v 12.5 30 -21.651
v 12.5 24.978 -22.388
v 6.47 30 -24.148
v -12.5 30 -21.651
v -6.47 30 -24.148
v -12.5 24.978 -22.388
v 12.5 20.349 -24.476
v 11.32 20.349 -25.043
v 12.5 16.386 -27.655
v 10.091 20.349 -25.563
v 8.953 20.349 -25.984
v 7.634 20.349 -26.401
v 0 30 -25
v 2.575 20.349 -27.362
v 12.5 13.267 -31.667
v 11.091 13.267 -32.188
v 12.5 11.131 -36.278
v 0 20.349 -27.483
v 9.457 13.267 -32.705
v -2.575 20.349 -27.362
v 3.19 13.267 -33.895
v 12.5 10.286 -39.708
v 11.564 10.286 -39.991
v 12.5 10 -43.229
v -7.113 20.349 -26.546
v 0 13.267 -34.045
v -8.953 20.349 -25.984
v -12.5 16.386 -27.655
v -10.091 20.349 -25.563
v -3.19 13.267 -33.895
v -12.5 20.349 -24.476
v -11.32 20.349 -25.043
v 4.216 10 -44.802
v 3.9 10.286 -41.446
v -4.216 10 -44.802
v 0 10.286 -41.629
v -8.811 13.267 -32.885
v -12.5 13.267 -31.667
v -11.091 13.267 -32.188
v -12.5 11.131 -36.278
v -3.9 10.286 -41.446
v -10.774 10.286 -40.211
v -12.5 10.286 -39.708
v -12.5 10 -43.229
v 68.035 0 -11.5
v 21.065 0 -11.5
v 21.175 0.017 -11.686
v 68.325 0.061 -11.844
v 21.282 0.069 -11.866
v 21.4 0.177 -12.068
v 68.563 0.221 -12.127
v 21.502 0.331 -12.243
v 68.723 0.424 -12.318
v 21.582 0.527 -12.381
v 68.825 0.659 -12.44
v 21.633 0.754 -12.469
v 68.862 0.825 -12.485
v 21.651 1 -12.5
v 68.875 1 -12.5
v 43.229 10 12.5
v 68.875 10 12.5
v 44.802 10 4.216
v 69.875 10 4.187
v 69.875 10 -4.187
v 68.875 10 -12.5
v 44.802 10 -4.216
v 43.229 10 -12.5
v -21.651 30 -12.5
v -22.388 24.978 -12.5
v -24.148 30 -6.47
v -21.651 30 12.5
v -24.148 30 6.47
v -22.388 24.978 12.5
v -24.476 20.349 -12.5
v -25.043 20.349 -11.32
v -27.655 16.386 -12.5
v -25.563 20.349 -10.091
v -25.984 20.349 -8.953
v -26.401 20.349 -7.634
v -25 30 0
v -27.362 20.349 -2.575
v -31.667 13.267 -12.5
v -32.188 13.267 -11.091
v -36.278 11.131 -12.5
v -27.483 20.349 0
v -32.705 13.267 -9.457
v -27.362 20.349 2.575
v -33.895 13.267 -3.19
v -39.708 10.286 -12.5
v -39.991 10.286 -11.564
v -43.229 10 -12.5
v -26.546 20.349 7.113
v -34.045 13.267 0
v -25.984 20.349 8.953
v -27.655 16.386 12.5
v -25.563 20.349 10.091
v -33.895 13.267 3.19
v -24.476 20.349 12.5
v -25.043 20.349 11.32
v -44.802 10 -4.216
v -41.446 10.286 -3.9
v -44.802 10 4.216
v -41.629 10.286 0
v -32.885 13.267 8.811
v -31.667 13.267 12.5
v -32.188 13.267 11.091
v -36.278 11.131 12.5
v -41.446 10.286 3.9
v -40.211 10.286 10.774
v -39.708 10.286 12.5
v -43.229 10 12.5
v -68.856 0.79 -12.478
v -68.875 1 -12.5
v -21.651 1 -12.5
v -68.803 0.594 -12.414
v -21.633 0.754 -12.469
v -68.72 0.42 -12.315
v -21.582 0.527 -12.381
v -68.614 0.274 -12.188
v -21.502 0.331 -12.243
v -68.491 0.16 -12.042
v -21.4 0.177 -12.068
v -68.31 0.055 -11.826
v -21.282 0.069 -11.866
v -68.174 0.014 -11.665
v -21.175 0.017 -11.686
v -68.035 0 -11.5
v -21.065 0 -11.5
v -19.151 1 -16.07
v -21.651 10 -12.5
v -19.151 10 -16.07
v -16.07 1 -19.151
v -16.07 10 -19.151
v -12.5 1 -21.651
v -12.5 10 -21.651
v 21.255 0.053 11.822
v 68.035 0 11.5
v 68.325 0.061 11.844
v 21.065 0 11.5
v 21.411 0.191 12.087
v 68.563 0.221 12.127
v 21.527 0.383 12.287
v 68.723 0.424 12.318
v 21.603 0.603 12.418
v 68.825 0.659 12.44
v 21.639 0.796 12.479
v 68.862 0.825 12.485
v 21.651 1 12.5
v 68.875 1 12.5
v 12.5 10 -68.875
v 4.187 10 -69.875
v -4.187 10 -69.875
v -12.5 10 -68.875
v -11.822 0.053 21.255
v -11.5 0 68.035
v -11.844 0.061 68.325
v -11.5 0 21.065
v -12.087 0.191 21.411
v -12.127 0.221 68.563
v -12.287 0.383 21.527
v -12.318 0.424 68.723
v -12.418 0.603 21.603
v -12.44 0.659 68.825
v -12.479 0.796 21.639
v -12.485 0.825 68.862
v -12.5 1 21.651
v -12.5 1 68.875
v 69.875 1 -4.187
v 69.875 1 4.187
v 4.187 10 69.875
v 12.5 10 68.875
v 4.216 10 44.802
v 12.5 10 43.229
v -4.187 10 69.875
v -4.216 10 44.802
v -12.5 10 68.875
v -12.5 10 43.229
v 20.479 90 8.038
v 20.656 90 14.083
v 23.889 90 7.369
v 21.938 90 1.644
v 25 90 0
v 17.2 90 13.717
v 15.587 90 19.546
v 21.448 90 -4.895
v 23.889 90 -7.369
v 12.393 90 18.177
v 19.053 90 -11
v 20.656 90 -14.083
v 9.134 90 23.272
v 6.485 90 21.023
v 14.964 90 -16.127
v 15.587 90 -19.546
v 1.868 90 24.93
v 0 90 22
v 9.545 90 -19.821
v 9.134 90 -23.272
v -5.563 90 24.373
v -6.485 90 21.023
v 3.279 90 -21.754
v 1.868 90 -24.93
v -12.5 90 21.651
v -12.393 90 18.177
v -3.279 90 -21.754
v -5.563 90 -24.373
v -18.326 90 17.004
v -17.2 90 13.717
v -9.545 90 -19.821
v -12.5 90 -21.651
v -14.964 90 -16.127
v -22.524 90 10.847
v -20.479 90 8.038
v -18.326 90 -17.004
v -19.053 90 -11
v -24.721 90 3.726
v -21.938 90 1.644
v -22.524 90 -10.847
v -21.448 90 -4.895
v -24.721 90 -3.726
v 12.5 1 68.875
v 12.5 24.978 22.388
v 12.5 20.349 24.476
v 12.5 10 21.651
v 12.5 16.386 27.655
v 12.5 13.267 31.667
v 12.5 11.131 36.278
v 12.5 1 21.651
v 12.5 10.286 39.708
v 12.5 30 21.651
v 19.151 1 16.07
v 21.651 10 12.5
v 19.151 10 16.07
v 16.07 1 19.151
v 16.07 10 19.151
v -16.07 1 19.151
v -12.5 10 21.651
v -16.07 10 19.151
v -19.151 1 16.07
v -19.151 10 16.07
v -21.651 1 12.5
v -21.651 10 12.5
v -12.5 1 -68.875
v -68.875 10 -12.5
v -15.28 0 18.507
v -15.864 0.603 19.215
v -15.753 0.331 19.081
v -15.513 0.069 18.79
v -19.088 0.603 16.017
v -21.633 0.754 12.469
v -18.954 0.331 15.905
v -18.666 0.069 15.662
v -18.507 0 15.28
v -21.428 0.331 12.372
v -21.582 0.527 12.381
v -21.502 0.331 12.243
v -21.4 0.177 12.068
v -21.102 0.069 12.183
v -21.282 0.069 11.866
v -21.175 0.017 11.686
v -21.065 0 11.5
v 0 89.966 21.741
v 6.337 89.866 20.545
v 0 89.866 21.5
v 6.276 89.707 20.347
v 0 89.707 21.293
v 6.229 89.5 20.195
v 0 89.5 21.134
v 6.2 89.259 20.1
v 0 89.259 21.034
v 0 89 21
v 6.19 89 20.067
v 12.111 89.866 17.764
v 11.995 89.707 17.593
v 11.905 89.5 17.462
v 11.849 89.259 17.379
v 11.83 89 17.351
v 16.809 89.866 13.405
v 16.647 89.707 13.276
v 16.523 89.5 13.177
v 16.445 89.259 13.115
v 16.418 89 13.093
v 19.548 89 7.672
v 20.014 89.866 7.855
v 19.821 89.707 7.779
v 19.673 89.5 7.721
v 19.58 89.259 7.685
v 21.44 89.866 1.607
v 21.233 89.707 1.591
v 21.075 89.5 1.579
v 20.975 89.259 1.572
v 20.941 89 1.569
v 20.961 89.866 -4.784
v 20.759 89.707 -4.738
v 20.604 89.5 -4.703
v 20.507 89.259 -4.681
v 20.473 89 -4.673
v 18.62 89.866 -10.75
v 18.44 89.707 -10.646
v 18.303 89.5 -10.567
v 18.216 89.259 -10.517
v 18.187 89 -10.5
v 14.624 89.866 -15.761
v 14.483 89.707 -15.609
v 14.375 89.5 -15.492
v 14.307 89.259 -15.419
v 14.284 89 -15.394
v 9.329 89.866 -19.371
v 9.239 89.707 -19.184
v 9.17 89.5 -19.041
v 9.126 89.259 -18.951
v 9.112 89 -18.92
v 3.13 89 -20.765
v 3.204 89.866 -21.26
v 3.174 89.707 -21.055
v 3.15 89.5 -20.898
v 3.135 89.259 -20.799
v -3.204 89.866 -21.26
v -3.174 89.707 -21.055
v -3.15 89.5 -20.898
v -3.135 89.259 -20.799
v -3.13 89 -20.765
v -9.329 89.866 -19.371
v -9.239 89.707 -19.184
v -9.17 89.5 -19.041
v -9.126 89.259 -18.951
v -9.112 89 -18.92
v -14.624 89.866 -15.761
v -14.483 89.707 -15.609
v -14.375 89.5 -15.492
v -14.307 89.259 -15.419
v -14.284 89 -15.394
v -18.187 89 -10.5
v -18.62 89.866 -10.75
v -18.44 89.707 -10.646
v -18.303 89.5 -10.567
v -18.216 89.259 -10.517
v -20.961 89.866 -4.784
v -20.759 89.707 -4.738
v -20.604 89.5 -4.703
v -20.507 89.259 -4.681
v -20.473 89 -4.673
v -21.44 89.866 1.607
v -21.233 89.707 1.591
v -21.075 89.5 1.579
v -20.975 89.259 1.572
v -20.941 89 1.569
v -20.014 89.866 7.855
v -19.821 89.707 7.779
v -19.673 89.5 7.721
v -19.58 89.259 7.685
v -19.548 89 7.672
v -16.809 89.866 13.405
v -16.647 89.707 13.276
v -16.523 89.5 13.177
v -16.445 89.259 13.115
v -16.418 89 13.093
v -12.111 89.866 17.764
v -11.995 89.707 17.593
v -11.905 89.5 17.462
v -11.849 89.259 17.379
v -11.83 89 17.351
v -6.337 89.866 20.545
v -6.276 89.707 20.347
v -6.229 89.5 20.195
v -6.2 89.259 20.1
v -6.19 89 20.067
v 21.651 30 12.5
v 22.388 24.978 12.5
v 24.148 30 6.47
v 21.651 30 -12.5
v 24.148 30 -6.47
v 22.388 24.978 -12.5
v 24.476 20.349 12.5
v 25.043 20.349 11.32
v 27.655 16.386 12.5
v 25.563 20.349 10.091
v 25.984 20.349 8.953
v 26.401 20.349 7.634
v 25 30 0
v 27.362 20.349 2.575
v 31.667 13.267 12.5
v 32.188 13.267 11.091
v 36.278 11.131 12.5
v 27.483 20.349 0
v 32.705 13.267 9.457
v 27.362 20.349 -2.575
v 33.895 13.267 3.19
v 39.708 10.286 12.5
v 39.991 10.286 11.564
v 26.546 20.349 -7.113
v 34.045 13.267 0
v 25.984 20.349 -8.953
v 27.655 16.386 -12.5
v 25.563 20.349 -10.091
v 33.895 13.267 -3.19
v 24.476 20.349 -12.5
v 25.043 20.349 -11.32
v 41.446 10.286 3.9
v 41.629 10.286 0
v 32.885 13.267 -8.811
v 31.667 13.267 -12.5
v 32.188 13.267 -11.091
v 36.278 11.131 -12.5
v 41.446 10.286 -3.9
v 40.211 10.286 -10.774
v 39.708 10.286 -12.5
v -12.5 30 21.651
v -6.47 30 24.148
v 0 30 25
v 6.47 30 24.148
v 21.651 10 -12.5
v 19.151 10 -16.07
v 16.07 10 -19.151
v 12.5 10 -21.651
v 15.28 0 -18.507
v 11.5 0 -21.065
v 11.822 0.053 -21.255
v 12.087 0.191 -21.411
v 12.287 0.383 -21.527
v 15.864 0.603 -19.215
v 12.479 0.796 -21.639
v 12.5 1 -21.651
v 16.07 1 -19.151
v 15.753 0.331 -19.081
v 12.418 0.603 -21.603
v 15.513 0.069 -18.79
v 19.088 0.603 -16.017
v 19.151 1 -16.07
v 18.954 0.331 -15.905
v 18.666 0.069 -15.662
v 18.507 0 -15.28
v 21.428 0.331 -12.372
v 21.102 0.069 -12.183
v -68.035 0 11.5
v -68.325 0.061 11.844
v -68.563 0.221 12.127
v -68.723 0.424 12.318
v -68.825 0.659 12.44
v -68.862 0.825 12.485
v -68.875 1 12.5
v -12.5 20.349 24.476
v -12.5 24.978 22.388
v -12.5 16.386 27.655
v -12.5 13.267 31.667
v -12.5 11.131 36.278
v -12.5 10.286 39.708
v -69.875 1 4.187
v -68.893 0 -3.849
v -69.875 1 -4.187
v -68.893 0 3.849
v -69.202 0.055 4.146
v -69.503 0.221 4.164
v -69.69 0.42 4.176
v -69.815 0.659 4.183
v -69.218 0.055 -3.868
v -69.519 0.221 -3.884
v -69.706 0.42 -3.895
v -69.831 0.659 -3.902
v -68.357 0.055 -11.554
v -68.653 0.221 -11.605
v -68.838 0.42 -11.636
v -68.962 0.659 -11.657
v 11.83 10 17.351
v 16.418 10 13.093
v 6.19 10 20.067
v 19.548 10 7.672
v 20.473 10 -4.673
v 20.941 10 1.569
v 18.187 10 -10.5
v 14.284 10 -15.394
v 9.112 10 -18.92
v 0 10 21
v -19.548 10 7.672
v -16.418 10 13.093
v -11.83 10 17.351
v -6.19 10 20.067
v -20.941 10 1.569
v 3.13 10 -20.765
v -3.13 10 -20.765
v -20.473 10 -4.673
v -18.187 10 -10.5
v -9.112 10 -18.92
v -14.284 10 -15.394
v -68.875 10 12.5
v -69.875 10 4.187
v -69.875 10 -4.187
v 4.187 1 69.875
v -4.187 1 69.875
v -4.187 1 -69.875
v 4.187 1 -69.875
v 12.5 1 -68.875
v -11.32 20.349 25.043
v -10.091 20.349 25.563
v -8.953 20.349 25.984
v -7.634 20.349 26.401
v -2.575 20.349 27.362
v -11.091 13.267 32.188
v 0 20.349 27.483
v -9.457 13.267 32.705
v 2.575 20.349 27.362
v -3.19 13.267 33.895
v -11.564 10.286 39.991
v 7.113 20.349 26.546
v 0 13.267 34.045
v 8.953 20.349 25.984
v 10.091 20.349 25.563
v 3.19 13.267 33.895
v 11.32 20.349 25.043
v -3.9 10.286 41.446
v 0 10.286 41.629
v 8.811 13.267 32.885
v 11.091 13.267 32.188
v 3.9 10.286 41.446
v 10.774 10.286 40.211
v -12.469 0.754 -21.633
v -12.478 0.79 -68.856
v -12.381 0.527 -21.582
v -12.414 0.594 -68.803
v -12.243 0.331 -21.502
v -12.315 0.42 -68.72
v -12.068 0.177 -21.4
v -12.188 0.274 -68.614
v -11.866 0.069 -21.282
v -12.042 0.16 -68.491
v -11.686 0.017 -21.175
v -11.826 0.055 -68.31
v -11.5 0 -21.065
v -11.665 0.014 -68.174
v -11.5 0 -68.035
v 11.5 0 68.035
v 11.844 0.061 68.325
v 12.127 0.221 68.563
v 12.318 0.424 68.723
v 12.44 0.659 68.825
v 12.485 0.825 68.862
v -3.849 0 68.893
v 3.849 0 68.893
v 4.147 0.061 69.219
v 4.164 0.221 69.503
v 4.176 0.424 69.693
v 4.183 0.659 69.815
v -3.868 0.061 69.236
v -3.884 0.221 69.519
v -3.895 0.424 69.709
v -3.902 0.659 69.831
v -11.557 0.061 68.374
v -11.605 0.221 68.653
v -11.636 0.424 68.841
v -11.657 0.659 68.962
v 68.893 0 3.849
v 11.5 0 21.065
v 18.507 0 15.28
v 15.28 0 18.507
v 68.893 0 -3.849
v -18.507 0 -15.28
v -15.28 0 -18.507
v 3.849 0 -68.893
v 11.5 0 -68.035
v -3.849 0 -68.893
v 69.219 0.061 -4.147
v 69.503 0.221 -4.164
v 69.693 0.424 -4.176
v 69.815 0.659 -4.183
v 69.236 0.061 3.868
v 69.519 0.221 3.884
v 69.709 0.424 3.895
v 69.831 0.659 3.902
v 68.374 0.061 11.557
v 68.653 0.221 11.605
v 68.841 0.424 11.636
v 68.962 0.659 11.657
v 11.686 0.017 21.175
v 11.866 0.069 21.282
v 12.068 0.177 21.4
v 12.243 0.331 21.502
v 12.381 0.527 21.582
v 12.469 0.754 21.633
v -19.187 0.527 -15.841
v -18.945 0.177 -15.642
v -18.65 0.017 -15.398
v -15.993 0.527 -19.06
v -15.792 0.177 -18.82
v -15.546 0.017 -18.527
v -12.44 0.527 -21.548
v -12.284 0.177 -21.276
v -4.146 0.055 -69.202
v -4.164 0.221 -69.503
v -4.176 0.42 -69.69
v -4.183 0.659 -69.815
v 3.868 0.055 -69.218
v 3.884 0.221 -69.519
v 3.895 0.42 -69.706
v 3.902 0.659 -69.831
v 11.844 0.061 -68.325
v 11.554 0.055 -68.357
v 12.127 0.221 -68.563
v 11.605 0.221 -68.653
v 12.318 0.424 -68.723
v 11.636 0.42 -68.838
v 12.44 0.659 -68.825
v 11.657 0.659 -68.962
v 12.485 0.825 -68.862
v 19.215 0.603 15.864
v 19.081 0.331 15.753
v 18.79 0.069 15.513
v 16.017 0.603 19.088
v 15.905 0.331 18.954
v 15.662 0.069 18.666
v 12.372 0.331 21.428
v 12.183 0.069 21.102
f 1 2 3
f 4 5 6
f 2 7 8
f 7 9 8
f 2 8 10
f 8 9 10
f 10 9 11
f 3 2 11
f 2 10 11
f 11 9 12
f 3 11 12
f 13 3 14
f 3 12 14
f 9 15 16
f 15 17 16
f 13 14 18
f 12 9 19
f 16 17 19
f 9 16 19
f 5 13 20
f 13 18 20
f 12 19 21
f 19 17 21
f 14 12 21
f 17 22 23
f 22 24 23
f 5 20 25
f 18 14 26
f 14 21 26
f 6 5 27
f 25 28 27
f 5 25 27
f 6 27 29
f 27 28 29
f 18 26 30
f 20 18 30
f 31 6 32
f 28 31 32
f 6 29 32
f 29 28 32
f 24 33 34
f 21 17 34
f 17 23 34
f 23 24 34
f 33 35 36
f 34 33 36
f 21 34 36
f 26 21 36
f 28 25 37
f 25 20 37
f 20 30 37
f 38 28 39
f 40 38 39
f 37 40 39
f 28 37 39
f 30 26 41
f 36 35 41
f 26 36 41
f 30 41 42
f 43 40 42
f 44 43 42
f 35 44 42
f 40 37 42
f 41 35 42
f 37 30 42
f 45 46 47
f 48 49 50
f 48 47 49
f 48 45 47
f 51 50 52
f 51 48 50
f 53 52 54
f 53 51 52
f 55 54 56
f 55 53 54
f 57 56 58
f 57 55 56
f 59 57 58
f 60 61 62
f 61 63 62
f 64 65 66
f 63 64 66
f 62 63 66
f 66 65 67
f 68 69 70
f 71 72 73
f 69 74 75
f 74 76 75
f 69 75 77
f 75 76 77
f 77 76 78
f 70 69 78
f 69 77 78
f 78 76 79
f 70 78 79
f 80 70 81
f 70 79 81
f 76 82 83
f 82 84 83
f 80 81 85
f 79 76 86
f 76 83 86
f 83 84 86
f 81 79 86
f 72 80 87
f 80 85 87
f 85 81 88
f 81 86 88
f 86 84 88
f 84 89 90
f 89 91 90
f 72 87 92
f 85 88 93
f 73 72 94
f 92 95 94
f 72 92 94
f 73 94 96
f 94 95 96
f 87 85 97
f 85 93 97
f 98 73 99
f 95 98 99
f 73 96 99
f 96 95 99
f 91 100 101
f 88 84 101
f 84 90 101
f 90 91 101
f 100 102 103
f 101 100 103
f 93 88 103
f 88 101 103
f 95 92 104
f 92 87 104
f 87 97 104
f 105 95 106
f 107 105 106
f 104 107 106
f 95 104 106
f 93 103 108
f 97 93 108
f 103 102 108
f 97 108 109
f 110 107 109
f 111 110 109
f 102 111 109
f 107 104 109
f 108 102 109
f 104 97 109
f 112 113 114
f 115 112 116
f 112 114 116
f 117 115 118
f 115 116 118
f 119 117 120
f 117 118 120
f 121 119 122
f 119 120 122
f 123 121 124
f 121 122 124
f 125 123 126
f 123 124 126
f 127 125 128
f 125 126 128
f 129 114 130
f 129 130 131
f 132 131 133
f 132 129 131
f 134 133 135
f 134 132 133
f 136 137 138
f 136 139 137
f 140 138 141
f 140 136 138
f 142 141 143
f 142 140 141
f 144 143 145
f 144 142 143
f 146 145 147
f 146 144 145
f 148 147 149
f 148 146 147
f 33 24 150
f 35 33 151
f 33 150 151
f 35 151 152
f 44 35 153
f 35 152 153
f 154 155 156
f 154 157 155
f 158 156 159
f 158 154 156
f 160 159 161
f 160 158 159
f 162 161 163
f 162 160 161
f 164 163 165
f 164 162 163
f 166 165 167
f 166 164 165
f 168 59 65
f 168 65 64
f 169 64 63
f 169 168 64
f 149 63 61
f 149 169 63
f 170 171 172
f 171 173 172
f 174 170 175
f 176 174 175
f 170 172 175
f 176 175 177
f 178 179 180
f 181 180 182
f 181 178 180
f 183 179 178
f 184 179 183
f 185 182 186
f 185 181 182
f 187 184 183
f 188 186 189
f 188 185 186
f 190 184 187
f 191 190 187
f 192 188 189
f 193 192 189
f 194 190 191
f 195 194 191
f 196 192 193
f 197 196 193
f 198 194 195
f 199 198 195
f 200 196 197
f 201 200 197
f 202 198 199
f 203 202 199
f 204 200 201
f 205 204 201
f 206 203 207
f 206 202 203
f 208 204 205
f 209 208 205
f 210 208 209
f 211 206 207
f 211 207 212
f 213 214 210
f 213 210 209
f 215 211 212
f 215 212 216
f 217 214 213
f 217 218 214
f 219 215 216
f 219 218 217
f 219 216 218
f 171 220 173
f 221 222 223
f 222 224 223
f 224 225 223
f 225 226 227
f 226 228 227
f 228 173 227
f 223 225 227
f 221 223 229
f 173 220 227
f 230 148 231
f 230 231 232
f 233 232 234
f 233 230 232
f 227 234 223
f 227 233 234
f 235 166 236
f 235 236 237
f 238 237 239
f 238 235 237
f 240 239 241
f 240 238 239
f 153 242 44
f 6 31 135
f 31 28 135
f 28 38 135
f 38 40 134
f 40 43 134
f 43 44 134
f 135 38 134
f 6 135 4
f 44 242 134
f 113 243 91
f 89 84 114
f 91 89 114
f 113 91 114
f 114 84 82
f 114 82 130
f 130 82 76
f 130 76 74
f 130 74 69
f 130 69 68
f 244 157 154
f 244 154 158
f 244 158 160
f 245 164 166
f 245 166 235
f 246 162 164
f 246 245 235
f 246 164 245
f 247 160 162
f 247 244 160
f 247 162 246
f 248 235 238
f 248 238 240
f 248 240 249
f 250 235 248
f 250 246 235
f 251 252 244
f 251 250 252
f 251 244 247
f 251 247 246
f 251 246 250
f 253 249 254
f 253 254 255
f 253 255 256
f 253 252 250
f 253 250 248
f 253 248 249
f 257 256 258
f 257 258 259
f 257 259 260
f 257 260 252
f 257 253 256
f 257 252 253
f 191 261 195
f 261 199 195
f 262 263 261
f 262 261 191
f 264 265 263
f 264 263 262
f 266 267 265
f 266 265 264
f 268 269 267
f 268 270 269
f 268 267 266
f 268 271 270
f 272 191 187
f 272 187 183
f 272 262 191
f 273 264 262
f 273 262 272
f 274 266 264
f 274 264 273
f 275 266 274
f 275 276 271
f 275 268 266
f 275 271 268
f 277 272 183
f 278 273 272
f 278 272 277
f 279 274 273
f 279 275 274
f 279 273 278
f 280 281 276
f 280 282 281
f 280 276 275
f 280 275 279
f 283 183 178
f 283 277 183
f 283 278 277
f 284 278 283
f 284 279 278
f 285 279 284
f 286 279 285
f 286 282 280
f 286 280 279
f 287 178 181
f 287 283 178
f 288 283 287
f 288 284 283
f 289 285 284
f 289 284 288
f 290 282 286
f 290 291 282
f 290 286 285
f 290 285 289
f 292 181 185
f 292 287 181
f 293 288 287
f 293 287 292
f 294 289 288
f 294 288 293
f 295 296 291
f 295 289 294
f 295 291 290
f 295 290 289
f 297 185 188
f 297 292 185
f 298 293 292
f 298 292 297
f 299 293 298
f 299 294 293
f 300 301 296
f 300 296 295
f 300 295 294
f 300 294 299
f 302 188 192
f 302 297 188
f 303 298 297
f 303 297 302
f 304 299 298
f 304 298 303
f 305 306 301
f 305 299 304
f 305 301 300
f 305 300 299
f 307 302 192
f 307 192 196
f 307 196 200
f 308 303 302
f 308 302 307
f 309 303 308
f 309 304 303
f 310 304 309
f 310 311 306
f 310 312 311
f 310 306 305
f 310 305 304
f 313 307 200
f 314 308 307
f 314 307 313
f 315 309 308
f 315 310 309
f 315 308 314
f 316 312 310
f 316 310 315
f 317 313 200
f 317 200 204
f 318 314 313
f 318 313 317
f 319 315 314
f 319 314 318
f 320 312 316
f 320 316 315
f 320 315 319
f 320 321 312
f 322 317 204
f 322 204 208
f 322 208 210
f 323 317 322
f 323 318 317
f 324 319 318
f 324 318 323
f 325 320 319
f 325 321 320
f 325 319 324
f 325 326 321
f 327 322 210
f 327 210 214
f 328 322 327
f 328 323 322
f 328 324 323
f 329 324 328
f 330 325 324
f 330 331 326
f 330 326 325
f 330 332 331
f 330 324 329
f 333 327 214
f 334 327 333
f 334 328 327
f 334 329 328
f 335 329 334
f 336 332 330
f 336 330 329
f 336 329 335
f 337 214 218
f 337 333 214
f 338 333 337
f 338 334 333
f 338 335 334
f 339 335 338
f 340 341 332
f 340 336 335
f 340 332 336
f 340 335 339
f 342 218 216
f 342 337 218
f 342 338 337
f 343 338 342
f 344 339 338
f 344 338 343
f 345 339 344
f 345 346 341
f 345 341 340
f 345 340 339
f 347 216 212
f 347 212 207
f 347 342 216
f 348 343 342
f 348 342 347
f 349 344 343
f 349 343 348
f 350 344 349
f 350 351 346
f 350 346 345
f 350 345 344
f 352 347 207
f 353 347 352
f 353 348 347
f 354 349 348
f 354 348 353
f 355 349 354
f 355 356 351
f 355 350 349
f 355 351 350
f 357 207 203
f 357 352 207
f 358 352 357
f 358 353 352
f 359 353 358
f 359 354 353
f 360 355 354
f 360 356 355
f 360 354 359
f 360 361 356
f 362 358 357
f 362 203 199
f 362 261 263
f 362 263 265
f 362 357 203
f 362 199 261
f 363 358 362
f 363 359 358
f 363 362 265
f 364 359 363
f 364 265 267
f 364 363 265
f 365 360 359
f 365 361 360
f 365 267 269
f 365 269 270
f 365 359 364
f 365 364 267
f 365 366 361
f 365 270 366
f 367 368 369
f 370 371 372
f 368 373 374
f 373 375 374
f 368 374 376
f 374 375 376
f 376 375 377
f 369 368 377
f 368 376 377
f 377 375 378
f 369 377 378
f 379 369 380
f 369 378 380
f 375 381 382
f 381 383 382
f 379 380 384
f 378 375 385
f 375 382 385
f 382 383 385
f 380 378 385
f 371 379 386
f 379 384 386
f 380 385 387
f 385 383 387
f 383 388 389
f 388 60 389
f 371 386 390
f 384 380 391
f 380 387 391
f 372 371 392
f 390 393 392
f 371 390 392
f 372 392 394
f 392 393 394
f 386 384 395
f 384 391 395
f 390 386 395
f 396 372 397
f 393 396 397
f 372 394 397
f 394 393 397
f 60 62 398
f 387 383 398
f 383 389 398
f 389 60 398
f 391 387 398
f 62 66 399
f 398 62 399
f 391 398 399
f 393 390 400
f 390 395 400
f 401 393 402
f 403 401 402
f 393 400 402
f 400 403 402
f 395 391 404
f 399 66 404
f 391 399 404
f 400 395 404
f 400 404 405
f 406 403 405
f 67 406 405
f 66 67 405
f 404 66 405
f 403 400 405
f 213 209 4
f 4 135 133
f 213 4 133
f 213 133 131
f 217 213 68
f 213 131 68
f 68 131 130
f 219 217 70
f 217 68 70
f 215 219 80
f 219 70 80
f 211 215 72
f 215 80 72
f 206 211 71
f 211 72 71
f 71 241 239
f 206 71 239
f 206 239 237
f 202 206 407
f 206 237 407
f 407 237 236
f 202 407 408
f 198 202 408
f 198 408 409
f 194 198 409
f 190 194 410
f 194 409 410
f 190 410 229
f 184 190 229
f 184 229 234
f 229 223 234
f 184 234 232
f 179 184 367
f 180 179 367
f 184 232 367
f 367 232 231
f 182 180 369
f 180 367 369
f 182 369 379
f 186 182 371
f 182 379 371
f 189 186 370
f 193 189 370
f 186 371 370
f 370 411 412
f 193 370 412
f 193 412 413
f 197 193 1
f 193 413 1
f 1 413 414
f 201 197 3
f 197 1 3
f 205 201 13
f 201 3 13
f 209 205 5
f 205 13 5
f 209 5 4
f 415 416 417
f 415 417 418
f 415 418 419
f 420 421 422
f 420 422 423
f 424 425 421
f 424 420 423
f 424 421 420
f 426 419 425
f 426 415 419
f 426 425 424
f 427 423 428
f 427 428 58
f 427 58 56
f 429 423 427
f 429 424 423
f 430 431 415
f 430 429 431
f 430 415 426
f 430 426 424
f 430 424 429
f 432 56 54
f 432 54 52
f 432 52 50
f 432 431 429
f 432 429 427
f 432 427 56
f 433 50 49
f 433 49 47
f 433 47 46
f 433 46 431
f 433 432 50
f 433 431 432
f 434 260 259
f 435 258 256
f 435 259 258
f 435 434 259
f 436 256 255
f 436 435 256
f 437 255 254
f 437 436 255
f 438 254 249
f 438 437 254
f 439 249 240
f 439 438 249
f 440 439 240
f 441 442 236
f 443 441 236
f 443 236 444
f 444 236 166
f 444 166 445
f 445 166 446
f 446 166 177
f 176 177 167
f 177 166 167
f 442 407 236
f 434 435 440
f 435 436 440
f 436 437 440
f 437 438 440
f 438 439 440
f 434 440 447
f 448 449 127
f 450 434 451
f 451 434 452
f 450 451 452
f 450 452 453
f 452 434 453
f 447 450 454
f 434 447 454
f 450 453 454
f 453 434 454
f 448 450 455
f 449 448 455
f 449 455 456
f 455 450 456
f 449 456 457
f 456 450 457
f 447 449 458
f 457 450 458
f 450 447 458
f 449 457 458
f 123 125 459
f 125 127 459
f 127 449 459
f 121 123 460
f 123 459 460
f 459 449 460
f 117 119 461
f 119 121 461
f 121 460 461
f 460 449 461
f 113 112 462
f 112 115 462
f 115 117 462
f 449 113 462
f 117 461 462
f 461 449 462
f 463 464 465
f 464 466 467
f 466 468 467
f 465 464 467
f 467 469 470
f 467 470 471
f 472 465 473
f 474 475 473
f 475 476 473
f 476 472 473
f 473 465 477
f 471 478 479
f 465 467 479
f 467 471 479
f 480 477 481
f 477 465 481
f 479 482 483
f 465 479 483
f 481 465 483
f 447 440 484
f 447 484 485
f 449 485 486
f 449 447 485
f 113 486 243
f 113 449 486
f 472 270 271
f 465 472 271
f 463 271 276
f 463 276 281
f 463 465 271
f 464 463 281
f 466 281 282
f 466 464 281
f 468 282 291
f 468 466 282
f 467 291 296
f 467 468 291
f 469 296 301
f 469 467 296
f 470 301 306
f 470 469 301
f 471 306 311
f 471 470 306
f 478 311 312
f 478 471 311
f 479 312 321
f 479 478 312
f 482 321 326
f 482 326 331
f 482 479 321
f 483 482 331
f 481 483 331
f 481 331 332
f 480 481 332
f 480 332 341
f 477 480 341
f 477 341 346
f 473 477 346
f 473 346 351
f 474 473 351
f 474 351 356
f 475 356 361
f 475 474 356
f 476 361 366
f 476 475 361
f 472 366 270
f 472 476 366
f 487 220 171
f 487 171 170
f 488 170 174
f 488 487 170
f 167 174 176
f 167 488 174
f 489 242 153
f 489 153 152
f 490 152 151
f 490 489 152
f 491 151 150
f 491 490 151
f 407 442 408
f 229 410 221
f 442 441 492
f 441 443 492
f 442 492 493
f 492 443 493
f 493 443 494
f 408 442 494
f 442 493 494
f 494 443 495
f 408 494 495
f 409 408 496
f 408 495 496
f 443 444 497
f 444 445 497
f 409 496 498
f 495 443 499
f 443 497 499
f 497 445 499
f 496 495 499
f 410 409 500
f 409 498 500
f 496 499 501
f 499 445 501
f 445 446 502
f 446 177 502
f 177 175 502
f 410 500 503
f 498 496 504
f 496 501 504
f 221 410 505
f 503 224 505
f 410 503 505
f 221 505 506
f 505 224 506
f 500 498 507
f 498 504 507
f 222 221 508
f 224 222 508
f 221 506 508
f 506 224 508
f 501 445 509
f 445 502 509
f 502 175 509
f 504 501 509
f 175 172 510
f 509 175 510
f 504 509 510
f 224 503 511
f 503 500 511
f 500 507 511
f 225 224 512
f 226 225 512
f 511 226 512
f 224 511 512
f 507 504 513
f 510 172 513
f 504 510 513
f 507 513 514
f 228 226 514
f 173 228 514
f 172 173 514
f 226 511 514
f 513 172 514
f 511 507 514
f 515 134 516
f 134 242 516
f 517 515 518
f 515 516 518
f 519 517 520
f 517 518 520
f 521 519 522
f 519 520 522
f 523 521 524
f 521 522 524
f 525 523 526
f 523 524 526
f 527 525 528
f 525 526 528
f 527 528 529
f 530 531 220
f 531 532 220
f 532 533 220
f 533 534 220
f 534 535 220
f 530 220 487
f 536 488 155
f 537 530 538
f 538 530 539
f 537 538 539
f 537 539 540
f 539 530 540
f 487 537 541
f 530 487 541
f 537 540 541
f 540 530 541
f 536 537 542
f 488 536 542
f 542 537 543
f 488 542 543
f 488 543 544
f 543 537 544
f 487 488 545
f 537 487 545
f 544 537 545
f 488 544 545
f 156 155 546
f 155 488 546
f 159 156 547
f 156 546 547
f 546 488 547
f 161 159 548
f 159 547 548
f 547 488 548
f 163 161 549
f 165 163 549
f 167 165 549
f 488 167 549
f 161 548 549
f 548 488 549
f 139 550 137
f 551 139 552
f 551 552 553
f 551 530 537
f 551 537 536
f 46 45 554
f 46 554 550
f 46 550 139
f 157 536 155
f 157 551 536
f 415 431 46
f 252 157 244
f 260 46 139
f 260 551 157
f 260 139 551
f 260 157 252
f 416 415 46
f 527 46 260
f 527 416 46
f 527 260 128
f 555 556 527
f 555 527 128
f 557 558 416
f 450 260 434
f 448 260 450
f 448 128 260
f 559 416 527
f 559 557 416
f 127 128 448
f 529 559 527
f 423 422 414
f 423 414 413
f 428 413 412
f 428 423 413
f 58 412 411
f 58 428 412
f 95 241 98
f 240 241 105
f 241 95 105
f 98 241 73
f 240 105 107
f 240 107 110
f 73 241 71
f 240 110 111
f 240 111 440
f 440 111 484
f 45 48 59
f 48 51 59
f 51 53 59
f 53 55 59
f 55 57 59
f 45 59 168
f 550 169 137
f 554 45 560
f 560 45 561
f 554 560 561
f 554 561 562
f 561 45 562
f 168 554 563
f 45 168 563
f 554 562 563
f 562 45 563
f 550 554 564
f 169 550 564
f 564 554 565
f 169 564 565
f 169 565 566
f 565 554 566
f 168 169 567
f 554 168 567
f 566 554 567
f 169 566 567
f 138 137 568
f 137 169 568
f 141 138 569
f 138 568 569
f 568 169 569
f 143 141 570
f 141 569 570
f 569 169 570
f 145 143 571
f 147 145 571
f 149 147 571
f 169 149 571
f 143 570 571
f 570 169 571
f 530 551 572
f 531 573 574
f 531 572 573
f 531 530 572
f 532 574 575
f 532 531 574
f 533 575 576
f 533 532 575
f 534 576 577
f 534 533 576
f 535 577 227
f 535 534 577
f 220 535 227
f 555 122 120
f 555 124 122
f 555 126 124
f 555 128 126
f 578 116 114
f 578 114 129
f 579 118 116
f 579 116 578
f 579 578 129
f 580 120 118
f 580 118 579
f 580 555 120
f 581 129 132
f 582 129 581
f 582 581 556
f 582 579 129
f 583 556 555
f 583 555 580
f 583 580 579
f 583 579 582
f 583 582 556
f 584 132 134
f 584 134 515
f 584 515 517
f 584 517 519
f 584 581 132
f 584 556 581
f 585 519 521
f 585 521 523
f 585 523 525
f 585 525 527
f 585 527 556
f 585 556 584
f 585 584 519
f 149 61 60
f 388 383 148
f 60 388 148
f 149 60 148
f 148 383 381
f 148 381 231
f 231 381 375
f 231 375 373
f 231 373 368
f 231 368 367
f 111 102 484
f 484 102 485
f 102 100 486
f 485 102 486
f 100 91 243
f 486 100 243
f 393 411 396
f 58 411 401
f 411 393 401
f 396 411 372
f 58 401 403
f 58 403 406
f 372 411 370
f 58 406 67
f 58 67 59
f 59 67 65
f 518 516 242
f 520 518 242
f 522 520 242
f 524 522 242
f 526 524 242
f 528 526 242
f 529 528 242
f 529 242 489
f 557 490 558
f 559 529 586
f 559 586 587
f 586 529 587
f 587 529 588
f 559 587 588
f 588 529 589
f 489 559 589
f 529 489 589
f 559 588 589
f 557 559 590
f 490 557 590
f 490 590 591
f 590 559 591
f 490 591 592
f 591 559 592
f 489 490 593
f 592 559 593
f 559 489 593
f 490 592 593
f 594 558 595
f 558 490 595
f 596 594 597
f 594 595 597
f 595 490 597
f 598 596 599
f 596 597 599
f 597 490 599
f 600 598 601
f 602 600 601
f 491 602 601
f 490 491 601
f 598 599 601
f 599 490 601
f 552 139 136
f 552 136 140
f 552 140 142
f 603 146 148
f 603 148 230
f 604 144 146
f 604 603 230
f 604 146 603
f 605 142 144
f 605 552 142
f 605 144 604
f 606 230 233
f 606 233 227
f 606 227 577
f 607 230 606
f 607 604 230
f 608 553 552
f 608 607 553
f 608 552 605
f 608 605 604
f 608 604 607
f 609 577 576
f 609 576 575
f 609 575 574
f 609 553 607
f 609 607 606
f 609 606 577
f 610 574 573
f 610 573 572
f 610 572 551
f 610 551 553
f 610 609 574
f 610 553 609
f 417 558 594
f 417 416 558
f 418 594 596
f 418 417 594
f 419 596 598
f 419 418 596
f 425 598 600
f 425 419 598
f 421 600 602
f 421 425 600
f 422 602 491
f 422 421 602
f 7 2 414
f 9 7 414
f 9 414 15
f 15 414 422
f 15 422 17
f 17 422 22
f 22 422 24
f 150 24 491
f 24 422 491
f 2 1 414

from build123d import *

# Parameters (mm, degrees)
BOSS_EXTRUDE1_DEPTH = 10
SKETCH2_R           = 25
SKETCH2_R_2         = 21
BOSS_EXTRUDE2_DEPTH = 80
FILLET1_R           = 1
FILLET2_R           = 20


with BuildPart() as part:
    # Sketch1 → Boss-Extrude1 (new body)
    with BuildSketch(Plane(origin=(0, 0, 0), x_dir=(1, 0, 0), z_dir=(0, 1, 0))):
        with BuildLine():
            Line((-68.87488657, 12.5), (-21.650635095, 12.5))
            ThreePointArc((-21.650635095, 12.5), (-17.67766953, 17.67766953), (-12.5, 21.650635095))
            Line((-12.5, 21.650635095), (-12.5, 68.87488657))
            ThreePointArc((-12.5, 68.87488657), (0, 70), (12.5, 68.87488657))
            Line((12.5, 68.87488657), (12.5, 21.650635095))
            ThreePointArc((12.5, 21.650635095), (17.67766953, 17.67766953), (21.650635095, 12.5))
            Line((21.650635095, 12.5), (68.87488657, 12.5))
            ThreePointArc((68.87488657, 12.5), (70, 0), (68.87488657, -12.5))
            Line((68.87488657, -12.5), (21.650635095, -12.5))
            ThreePointArc((21.650635095, -12.5), (17.67766953, -17.67766953), (12.5, -21.650635095))
            Line((12.5, -21.650635095), (12.5, -68.87488657))
            ThreePointArc((12.5, -68.87488657), (0, -70), (-12.5, -68.87488657))
            Line((-12.5, -68.87488657), (-12.5, -21.650635095))
            ThreePointArc((-12.5, -21.650635095), (-17.67766953, -17.67766953), (-21.650635095, -12.5))
            Line((-21.650635095, -12.5), (-68.87488657, -12.5))
            ThreePointArc((-68.87488657, -12.5), (-70, 0), (-68.87488657, 12.5))
        make_face()
    extrude(amount=BOSS_EXTRUDE1_DEPTH)

    # Sketch2 → Boss-Extrude2 (add)
    with BuildSketch(Plane(origin=(0, 10, 0), x_dir=(1, 0, 0), z_dir=(0, 1, 0))):
        with Locations(Location((0, 0, 0), (0, 0, 120))):
            Circle(SKETCH2_R)
        with Locations(Location((0, 0, 0), (0, 0, 270))):
            Circle(SKETCH2_R_2, mode=Mode.SUBTRACT)
    extrude(amount=BOSS_EXTRUDE2_DEPTH)

    # Fillet1
    fillet1_edges = [part.edges().sort_by_distance(p)[0] for p in [
        (-45.262760832, 0, -12.5),
        (-17.67766953, 0, -17.67766953),
        (-12.5, 0, -45.262760832),
        (0, 0, -70),
        (12.5, 0, -45.262760832),
        (17.67766953, 0, -17.67766953),
        (45.262760832, 0, -12.5),
        (70, 0, 0),
        (45.262760832, 0, 12.5),
        (17.67766953, 0, 17.67766953),
        (12.5, 0, 45.262760832),
        (0, 0, 70),
        (-12.5, 0, 45.262760832),
        (-17.67766953, 0, 17.67766953),
        (-45.262760832, 0, 12.5),
        (-70, 0, 0),
        (0, 90, -21),
    ]]
    fillet(fillet1_edges, radius=FILLET1_R)

    # Fillet2
    # the kernel refuses this fillet: 20 mm, written as the material it adds along each edge
    with BuildSketch(Plane(origin=(0, 10, 0), x_dir=(-0.5791102310921431, 0, -0.8152492503795417), z_dir=(0.8152492503795417, 0, -0.5791102310921431))) as fillet2_piece_1_section:
        with BuildLine():
            CenterArc((25 + FILLET2_R, FILLET2_R), FILLET2_R, 180, 90)
            Line((25 + FILLET2_R, 0), (25, 0))
            Line((25, 0), (25, FILLET2_R))
        make_face()
    fillet2_piece_1 = revolve(axis=Axis((0, 10, 0), (0, 1, 0)), revolution_arc=289.224029318, mode=Mode.PRIVATE)
    fillet2_piece_1 = split(fillet2_piece_1, bisect_by=Plane(origin=(-28.534533207, 14.552524817, -12.5), z_dir=(0, 0, 1)), keep=Keep.TOP, mode=Mode.PRIVATE)
    fillet2_piece_1 = split(fillet2_piece_1, bisect_by=Plane(origin=(-28.534533207, 14.552524817, 12.5), z_dir=(0, 0, -1)), keep=Keep.TOP, mode=Mode.PRIVATE)
    fillet2_piece_1 = split(fillet2_piece_1, bisect_by=Plane(origin=(12.5, 14.552524817, 2.701e-06), z_dir=(-1, 0, 0)), keep=Keep.TOP, mode=Mode.PRIVATE)
    add(fillet2_piece_1)
    with BuildSketch(Plane(origin=(0, 10, 0), x_dir=(-0.5791102310921431, 0, -0.8152492503795417), z_dir=(0.8152492503795417, 0, -0.5791102310921431))) as fillet2_piece_2_section:
        with BuildLine():
            CenterArc((25 + FILLET2_R, FILLET2_R), FILLET2_R, 180, 90)
            Line((25 + FILLET2_R, 0), (25, 0))
            Line((25, 0), (25, FILLET2_R))
        make_face()
    fillet2_piece_2 = revolve(axis=Axis((0, 10, 0), (0, 1, 0)), revolution_arc=289.224029318, mode=Mode.PRIVATE)
    fillet2_piece_2 = split(fillet2_piece_2, bisect_by=Plane(origin=(-12.5, 14.552524817, 28.534533207), z_dir=(1, 0, 0)), keep=Keep.TOP, mode=Mode.PRIVATE)
    fillet2_piece_2 = split(fillet2_piece_2, bisect_by=Plane(origin=(12.5, 14.552524817, 28.534533207), z_dir=(-1, 0, 0)), keep=Keep.TOP, mode=Mode.PRIVATE)
    add(fillet2_piece_2)
    with BuildSketch(Plane(origin=(0, 10, 0), x_dir=(-0.5791102310921431, 0, -0.8152492503795417), z_dir=(0.8152492503795417, 0, -0.5791102310921431))) as fillet2_piece_3_section:
        with BuildLine():
            CenterArc((25 + FILLET2_R, FILLET2_R), FILLET2_R, 180, 90)
            Line((25 + FILLET2_R, 0), (25, 0))
            Line((25, 0), (25, FILLET2_R))
        make_face()
    fillet2_piece_3 = revolve(axis=Axis((0, 10, 0), (0, 1, 0)), revolution_arc=289.224029318, mode=Mode.PRIVATE)
    fillet2_piece_3 = split(fillet2_piece_3, bisect_by=Plane(origin=(28.534533207, 14.552524817, -12.5), z_dir=(0, 0, 1)), keep=Keep.TOP, mode=Mode.PRIVATE)
    fillet2_piece_3 = split(fillet2_piece_3, bisect_by=Plane(origin=(28.534533207, 14.552524817, 12.5), z_dir=(0, 0, -1)), keep=Keep.TOP, mode=Mode.PRIVATE)
    fillet2_piece_3 = split(fillet2_piece_3, bisect_by=Plane(origin=(12.5, 14.552524817, -2.701e-06), z_dir=(1, 0, 0)), keep=Keep.TOP, mode=Mode.PRIVATE)
    add(fillet2_piece_3)
    with BuildSketch(Plane(origin=(0, 10, 0), x_dir=(0.8152492503795357, 0, -0.5791102310921514), z_dir=(0.5791102310921514, 0, 0.8152492503795357))) as fillet2_piece_4_section:
        with BuildLine():
            CenterArc((25 + FILLET2_R, FILLET2_R), FILLET2_R, 180, 90)
            Line((25, FILLET2_R), (25, 0))
            Line((25, 0), (25 + FILLET2_R, 0))
        make_face()
    fillet2_piece_4 = revolve(axis=Axis((0, 10, 0), (0, 1, 0)), revolution_arc=289.224029318, mode=Mode.PRIVATE)
    fillet2_piece_4 = split(fillet2_piece_4, bisect_by=Plane(origin=(-5.76e-07, 14.552525886, 12.5), z_dir=(0, 0, -1)), keep=Keep.TOP, mode=Mode.PRIVATE)
    fillet2_piece_4 = split(fillet2_piece_4, bisect_by=Plane(origin=(-12.5, 14.552525886, -28.534534116), z_dir=(1, 0, 0)), keep=Keep.TOP, mode=Mode.PRIVATE)
    fillet2_piece_4 = split(fillet2_piece_4, bisect_by=Plane(origin=(12.5, 14.552525886, -28.534534116), z_dir=(-1, 0, 0)), keep=Keep.TOP, mode=Mode.PRIVATE)
    add(fillet2_piece_4)
    with BuildSketch(Plane(origin=(0, 10, 0), x_dir=(0.8152492503795357, 0, -0.5791102310921514), z_dir=(0.5791102310921514, 0, 0.8152492503795357))) as fillet2_piece_5_section:
        with BuildLine():
            CenterArc((25 + FILLET2_R, FILLET2_R), FILLET2_R, 180, 90)
            Line((25, FILLET2_R), (25, 0))
            Line((25, 0), (25 + FILLET2_R, 0))
        make_face()
    fillet2_piece_5 = revolve(axis=Axis((0, 10, 0), (0, 1, 0)), revolution_arc=289.224029318, mode=Mode.PRIVATE)
    fillet2_piece_5 = split(fillet2_piece_5, bisect_by=Plane(origin=(-28.534534116, 14.552525886, -12.5), z_dir=(0, 0, 1)), keep=Keep.TOP, mode=Mode.PRIVATE)
    fillet2_piece_5 = split(fillet2_piece_5, bisect_by=Plane(origin=(-28.534534116, 14.552525886, 12.5), z_dir=(0, 0, -1)), keep=Keep.TOP, mode=Mode.PRIVATE)
    add(fillet2_piece_5)
    with BuildSketch(Plane(origin=(0, 10, 0), x_dir=(0.8152492503795357, 0, -0.5791102310921514), z_dir=(0.5791102310921514, 0, 0.8152492503795357))) as fillet2_piece_6_section:
        with BuildLine():
            CenterArc((25 + FILLET2_R, FILLET2_R), FILLET2_R, 180, 90)
            Line((25, FILLET2_R), (25, 0))
            Line((25, 0), (25 + FILLET2_R, 0))
        make_face()
    fillet2_piece_6 = revolve(axis=Axis((0, 10, 0), (0, 1, 0)), revolution_arc=289.224029318, mode=Mode.PRIVATE)
    fillet2_piece_6 = split(fillet2_piece_6, bisect_by=Plane(origin=(5.76e-07, 14.552525886, 12.5), z_dir=(0, 0, 1)), keep=Keep.TOP, mode=Mode.PRIVATE)
    fillet2_piece_6 = split(fillet2_piece_6, bisect_by=Plane(origin=(-12.5, 14.552525886, 28.534534116), z_dir=(1, 0, 0)), keep=Keep.TOP, mode=Mode.PRIVATE)
    fillet2_piece_6 = split(fillet2_piece_6, bisect_by=Plane(origin=(12.5, 14.552525886, 28.534534116), z_dir=(-1, 0, 0)), keep=Keep.TOP, mode=Mode.PRIVATE)
    add(fillet2_piece_6)
    with BuildSketch(Plane(origin=(0, 10, 0), x_dir=(0.5791102310921488, 0, 0.8152492503795377), z_dir=(-0.8152492503795377, 0, 0.5791102310921488))) as fillet2_piece_7_section:
        with BuildLine():
            CenterArc((25 + FILLET2_R, FILLET2_R), FILLET2_R, 180, 90)
            Line((25 + FILLET2_R, 0), (25, 0))
            Line((25, 0), (25, FILLET2_R))
        make_face()
    fillet2_piece_7 = revolve(axis=Axis((0, 10, 0), (0, 1, 0)), revolution_arc=289.224029318, mode=Mode.PRIVATE)
    fillet2_piece_7 = split(fillet2_piece_7, bisect_by=Plane(origin=(28.534533207, 14.552524817, -12.5), z_dir=(0, 0, 1)), keep=Keep.TOP, mode=Mode.PRIVATE)
    fillet2_piece_7 = split(fillet2_piece_7, bisect_by=Plane(origin=(28.534533207, 14.552524817, 12.5), z_dir=(0, 0, -1)), keep=Keep.TOP, mode=Mode.PRIVATE)
    fillet2_piece_7 = split(fillet2_piece_7, bisect_by=Plane(origin=(12.5, 14.552524817, -2.701e-06), z_dir=(1, 0, 0)), keep=Keep.TOP, mode=Mode.PRIVATE)
    add(fillet2_piece_7)
    with BuildSketch(Plane(origin=(0, 10, 0), x_dir=(0.5791102310921488, 0, 0.8152492503795377), z_dir=(-0.8152492503795377, 0, 0.5791102310921488))) as fillet2_piece_8_section:
        with BuildLine():
            CenterArc((25 + FILLET2_R, FILLET2_R), FILLET2_R, 180, 90)
            Line((25 + FILLET2_R, 0), (25, 0))
            Line((25, 0), (25, FILLET2_R))
        make_face()
    fillet2_piece_8 = revolve(axis=Axis((0, 10, 0), (0, 1, 0)), revolution_arc=289.224029318, mode=Mode.PRIVATE)
    fillet2_piece_8 = split(fillet2_piece_8, bisect_by=Plane(origin=(-12.5, 14.552524817, -28.534533207), z_dir=(1, 0, 0)), keep=Keep.TOP, mode=Mode.PRIVATE)
    fillet2_piece_8 = split(fillet2_piece_8, bisect_by=Plane(origin=(12.5, 14.552524817, -28.534533207), z_dir=(-1, 0, 0)), keep=Keep.TOP, mode=Mode.PRIVATE)
    add(fillet2_piece_8)
    with BuildSketch(Plane(origin=(0, 10, 0), x_dir=(0.5791102310921488, 0, 0.8152492503795377), z_dir=(-0.8152492503795377, 0, 0.5791102310921488))) as fillet2_piece_9_section:
        with BuildLine():
            CenterArc((25 + FILLET2_R, FILLET2_R), FILLET2_R, 180, 90)
            Line((25 + FILLET2_R, 0), (25, 0))
            Line((25, 0), (25, FILLET2_R))
        make_face()
    fillet2_piece_9 = revolve(axis=Axis((0, 10, 0), (0, 1, 0)), revolution_arc=289.224029318, mode=Mode.PRIVATE)
    fillet2_piece_9 = split(fillet2_piece_9, bisect_by=Plane(origin=(-28.534533207, 14.552524817, -12.5), z_dir=(0, 0, 1)), keep=Keep.TOP, mode=Mode.PRIVATE)
    fillet2_piece_9 = split(fillet2_piece_9, bisect_by=Plane(origin=(-28.534533207, 14.552524817, 12.5), z_dir=(0, 0, -1)), keep=Keep.TOP, mode=Mode.PRIVATE)
    fillet2_piece_9 = split(fillet2_piece_9, bisect_by=Plane(origin=(12.5, 14.552524817, 2.701e-06), z_dir=(-1, 0, 0)), keep=Keep.TOP, mode=Mode.PRIVATE)
    add(fillet2_piece_9)
    with BuildSketch(Plane(origin=(0, 10, 0), x_dir=(-0.8152492503795393, 0, 0.5791102310921463), z_dir=(-0.5791102310921463, 0, -0.8152492503795393))) as fillet2_piece_10_section:
        with BuildLine():
            CenterArc((25 + FILLET2_R, FILLET2_R), FILLET2_R, 180, 90)
            Line((25 + FILLET2_R, 0), (25, 0))
            Line((25, 0), (25, FILLET2_R))
        make_face()
    fillet2_piece_10 = revolve(axis=Axis((0, 10, 0), (0, 1, 0)), revolution_arc=289.224029318, mode=Mode.PRIVATE)
    fillet2_piece_10 = split(fillet2_piece_10, bisect_by=Plane(origin=(-12.5, 14.552524817, 28.534533207), z_dir=(1, 0, 0)), keep=Keep.TOP, mode=Mode.PRIVATE)
    fillet2_piece_10 = split(fillet2_piece_10, bisect_by=Plane(origin=(2.701e-06, 14.552524817, 12.5), z_dir=(0, 0, 1)), keep=Keep.TOP, mode=Mode.PRIVATE)
    fillet2_piece_10 = split(fillet2_piece_10, bisect_by=Plane(origin=(12.5, 14.552524817, 28.534533207), z_dir=(-1, 0, 0)), keep=Keep.TOP, mode=Mode.PRIVATE)
    add(fillet2_piece_10)
    with BuildSketch(Plane(origin=(0, 10, 0), x_dir=(-0.8152492503795393, 0, 0.5791102310921463), z_dir=(-0.5791102310921463, 0, -0.8152492503795393))) as fillet2_piece_11_section:
        with BuildLine():
            CenterArc((25 + FILLET2_R, FILLET2_R), FILLET2_R, 180, 90)
            Line((25 + FILLET2_R, 0), (25, 0))
            Line((25, 0), (25, FILLET2_R))
        make_face()
    fillet2_piece_11 = revolve(axis=Axis((0, 10, 0), (0, 1, 0)), revolution_arc=289.224029318, mode=Mode.PRIVATE)
    fillet2_piece_11 = split(fillet2_piece_11, bisect_by=Plane(origin=(28.534533207, 14.552524817, -12.5), z_dir=(0, 0, 1)), keep=Keep.TOP, mode=Mode.PRIVATE)
    fillet2_piece_11 = split(fillet2_piece_11, bisect_by=Plane(origin=(28.534533207, 14.552524817, 12.5), z_dir=(0, 0, -1)), keep=Keep.TOP, mode=Mode.PRIVATE)
    add(fillet2_piece_11)
    with BuildSketch(Plane(origin=(0, 10, 0), x_dir=(-0.8152492503795393, 0, 0.5791102310921463), z_dir=(-0.5791102310921463, 0, -0.8152492503795393))) as fillet2_piece_12_section:
        with BuildLine():
            CenterArc((25 + FILLET2_R, FILLET2_R), FILLET2_R, 180, 90)
            Line((25 + FILLET2_R, 0), (25, 0))
            Line((25, 0), (25, FILLET2_R))
        make_face()
    fillet2_piece_12 = revolve(axis=Axis((0, 10, 0), (0, 1, 0)), revolution_arc=289.224029318, mode=Mode.PRIVATE)
    fillet2_piece_12 = split(fillet2_piece_12, bisect_by=Plane(origin=(-12.5, 14.552524817, -28.534533207), z_dir=(1, 0, 0)), keep=Keep.TOP, mode=Mode.PRIVATE)
    fillet2_piece_12 = split(fillet2_piece_12, bisect_by=Plane(origin=(-2.701e-06, 14.552524817, 12.5), z_dir=(0, 0, -1)), keep=Keep.TOP, mode=Mode.PRIVATE)
    fillet2_piece_12 = split(fillet2_piece_12, bisect_by=Plane(origin=(12.5, 14.552524817, -28.534533207), z_dir=(-1, 0, 0)), keep=Keep.TOP, mode=Mode.PRIVATE)
    add(fillet2_piece_12)


solid = part.part
